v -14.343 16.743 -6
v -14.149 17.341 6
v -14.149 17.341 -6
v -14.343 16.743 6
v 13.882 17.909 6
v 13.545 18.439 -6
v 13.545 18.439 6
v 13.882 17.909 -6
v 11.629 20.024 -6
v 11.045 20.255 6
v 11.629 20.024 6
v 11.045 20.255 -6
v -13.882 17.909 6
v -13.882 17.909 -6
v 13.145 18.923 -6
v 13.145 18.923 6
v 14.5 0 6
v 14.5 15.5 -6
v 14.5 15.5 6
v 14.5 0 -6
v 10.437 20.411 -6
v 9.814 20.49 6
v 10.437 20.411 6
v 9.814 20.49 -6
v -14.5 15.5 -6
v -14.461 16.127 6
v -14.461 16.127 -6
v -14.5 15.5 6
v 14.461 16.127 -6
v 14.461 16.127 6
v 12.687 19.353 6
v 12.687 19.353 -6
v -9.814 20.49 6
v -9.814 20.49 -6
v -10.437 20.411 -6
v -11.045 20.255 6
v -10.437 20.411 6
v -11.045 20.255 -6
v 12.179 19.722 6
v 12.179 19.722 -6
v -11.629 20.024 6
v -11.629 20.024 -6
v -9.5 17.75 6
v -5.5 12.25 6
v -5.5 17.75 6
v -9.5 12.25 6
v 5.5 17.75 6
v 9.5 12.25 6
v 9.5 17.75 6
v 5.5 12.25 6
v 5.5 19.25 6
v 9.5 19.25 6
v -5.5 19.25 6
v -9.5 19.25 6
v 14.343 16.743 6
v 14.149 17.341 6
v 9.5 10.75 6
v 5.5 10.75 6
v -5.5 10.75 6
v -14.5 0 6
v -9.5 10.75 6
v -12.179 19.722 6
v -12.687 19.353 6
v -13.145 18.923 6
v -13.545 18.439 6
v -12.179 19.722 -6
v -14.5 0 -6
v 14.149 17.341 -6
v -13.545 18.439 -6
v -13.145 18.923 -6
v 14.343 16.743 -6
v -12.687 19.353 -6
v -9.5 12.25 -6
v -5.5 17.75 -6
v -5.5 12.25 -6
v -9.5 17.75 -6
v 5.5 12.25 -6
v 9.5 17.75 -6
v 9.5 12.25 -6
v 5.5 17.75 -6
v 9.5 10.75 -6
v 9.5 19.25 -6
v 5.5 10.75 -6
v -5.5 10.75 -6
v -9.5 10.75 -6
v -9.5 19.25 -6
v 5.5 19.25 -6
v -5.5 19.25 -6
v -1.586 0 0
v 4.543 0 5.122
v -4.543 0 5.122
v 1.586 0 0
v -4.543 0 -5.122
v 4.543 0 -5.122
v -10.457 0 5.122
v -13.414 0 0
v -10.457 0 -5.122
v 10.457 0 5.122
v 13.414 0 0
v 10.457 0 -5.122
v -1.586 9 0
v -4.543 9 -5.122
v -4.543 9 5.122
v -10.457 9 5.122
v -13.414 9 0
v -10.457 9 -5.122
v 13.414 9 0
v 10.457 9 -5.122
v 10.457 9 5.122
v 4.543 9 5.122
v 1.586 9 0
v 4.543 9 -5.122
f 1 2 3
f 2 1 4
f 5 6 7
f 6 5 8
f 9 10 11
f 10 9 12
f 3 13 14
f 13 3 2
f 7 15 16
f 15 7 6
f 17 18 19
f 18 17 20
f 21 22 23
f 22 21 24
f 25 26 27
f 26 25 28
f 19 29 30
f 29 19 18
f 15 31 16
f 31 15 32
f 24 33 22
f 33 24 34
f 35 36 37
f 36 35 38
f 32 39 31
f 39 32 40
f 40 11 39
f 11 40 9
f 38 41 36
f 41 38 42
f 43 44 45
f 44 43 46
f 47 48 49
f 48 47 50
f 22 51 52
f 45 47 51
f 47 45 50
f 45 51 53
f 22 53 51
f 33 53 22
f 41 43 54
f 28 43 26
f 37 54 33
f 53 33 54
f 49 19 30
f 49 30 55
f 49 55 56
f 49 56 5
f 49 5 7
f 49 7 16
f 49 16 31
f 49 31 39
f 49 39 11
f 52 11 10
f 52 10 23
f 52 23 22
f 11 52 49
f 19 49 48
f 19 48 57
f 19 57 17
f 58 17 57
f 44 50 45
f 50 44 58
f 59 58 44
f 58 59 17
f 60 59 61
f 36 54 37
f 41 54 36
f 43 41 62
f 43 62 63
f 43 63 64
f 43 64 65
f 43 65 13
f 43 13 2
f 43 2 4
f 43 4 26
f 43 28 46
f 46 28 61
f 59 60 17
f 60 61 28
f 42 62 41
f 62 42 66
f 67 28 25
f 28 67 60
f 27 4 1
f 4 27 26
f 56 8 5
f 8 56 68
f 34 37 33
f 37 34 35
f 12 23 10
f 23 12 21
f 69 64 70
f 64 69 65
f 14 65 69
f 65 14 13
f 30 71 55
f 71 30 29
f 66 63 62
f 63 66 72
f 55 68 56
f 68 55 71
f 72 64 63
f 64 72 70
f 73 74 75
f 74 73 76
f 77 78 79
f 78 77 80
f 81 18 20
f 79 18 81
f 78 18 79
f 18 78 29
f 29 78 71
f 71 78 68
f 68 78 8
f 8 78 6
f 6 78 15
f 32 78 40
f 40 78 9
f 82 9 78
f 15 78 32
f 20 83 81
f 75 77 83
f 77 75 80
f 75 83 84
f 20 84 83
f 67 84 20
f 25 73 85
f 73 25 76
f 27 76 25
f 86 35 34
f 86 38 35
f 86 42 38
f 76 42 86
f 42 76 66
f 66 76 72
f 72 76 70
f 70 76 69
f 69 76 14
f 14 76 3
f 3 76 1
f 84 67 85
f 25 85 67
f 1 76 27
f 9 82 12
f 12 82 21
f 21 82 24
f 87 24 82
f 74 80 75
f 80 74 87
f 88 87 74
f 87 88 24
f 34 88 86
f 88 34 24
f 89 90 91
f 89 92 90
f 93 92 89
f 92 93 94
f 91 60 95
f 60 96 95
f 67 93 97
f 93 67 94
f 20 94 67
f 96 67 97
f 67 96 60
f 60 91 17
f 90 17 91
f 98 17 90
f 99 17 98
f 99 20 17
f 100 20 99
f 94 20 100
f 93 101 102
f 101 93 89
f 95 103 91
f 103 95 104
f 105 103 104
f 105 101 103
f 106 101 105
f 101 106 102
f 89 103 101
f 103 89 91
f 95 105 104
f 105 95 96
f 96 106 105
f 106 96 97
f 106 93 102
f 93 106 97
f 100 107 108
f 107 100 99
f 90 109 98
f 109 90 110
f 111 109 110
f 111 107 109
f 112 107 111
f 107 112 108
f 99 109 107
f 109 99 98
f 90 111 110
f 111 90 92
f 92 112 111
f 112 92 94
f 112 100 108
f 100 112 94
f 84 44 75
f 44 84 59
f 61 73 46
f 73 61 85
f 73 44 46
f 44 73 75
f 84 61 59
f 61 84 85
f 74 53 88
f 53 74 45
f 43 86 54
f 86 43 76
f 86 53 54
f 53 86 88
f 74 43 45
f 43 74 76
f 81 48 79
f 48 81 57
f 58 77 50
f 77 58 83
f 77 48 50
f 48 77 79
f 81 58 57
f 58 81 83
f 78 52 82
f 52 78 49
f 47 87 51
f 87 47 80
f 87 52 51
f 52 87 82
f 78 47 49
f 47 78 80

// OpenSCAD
$fn = 50;


difference() {
	union() {
		translate(v = [0, 13.5000000000, -6.0000000000]) {
			hull() {
				translate(v = [-9.5000000000, 2.0000000000, 0]) {
					cylinder(h = 12, r = 5);
				}
				translate(v = [9.5000000000, 2.0000000000, 0]) {
					cylinder(h = 12, r = 5);
				}
				translate(v = [-9.5000000000, -2.0000000000, 0]) {
					cylinder(h = 12, r = 5);
				}
				translate(v = [9.5000000000, -2.0000000000, 0]) {
					cylinder(h = 12, r = 5);
				}
			}
		}
		translate(v = [0, 13.5000000000, -6.0000000000]) {
			hull() {
				translate(v = [-9.5000000000, 2.0000000000, 0]) {
					cylinder(h = 12, r = 5);
				}
				translate(v = [9.5000000000, 2.0000000000, 0]) {
					cylinder(h = 12, r = 5);
				}
				translate(v = [-9.5000000000, -2.0000000000, 0]) {
					cylinder(h = 12, r = 5);
				}
				translate(v = [9.5000000000, -2.0000000000, 0]) {
					cylinder(h = 12, r = 5);
				}
			}
		}
		translate(v = [-14.5000000000, 0, -6.0000000000]) {
			cube(size = [29, 13.5000000000, 12]);
		}
	}
	union() {
		translate(v = [-7.5000000000, 9, 0]) {
			rotate(a = [0, 0, 0]) {
				difference() {
					union() {
						rotate(a = [90, 0, 0]) {
							linear_extrude(height = 13.5000000000) {
								polygon(points = [[5.9142500000, 0.0000000000], [2.9571250000, 5.1218907443], [-2.9571250000, 5.1218907443], [-5.9142500000, 0.0000000000], [-2.9571250000, -5.1218907443], [2.9571250000, -5.1218907443]]);
							}
						}
					}
					union();
				}
			}
		}
		translate(v = [7.5000000000, 9, 0]) {
			rotate(a = [0, 0, 0]) {
				difference() {
					union() {
						rotate(a = [90, 0, 0]) {
							linear_extrude(height = 13.5000000000) {
								polygon(points = [[5.9142500000, 0.0000000000], [2.9571250000, 5.1218907443], [-2.9571250000, 5.1218907443], [-5.9142500000, 0.0000000000], [-2.9571250000, -5.1218907443], [2.9571250000, -5.1218907443]]);
							}
						}
					}
					union();
				}
			}
		}
		translate(v = [-9.5000000000, 10.7500000000, -50]) {
			cube(size = [4, 1.5000000000, 100]);
		}
		translate(v = [-9.5000000000, 17.7500000000, -50]) {
			cube(size = [4, 1.5000000000, 100]);
		}
		translate(v = [-7.5000000000, 8, 0]) {
			rotate(a = [90, 0, 0]) {
				cylinder(h = 8, r = 3.2500000000);
			}
		}
		translate(v = [5.5000000000, 10.7500000000, -50]) {
			cube(size = [4, 1.5000000000, 100]);
		}
		translate(v = [5.5000000000, 17.7500000000, -50]) {
			cube(size = [4, 1.5000000000, 100]);
		}
		translate(v = [7.5000000000, 8, 0]) {
			rotate(a = [90, 0, 0]) {
				cylinder(h = 8, r = 3.2500000000);
			}
		}
	}
}
